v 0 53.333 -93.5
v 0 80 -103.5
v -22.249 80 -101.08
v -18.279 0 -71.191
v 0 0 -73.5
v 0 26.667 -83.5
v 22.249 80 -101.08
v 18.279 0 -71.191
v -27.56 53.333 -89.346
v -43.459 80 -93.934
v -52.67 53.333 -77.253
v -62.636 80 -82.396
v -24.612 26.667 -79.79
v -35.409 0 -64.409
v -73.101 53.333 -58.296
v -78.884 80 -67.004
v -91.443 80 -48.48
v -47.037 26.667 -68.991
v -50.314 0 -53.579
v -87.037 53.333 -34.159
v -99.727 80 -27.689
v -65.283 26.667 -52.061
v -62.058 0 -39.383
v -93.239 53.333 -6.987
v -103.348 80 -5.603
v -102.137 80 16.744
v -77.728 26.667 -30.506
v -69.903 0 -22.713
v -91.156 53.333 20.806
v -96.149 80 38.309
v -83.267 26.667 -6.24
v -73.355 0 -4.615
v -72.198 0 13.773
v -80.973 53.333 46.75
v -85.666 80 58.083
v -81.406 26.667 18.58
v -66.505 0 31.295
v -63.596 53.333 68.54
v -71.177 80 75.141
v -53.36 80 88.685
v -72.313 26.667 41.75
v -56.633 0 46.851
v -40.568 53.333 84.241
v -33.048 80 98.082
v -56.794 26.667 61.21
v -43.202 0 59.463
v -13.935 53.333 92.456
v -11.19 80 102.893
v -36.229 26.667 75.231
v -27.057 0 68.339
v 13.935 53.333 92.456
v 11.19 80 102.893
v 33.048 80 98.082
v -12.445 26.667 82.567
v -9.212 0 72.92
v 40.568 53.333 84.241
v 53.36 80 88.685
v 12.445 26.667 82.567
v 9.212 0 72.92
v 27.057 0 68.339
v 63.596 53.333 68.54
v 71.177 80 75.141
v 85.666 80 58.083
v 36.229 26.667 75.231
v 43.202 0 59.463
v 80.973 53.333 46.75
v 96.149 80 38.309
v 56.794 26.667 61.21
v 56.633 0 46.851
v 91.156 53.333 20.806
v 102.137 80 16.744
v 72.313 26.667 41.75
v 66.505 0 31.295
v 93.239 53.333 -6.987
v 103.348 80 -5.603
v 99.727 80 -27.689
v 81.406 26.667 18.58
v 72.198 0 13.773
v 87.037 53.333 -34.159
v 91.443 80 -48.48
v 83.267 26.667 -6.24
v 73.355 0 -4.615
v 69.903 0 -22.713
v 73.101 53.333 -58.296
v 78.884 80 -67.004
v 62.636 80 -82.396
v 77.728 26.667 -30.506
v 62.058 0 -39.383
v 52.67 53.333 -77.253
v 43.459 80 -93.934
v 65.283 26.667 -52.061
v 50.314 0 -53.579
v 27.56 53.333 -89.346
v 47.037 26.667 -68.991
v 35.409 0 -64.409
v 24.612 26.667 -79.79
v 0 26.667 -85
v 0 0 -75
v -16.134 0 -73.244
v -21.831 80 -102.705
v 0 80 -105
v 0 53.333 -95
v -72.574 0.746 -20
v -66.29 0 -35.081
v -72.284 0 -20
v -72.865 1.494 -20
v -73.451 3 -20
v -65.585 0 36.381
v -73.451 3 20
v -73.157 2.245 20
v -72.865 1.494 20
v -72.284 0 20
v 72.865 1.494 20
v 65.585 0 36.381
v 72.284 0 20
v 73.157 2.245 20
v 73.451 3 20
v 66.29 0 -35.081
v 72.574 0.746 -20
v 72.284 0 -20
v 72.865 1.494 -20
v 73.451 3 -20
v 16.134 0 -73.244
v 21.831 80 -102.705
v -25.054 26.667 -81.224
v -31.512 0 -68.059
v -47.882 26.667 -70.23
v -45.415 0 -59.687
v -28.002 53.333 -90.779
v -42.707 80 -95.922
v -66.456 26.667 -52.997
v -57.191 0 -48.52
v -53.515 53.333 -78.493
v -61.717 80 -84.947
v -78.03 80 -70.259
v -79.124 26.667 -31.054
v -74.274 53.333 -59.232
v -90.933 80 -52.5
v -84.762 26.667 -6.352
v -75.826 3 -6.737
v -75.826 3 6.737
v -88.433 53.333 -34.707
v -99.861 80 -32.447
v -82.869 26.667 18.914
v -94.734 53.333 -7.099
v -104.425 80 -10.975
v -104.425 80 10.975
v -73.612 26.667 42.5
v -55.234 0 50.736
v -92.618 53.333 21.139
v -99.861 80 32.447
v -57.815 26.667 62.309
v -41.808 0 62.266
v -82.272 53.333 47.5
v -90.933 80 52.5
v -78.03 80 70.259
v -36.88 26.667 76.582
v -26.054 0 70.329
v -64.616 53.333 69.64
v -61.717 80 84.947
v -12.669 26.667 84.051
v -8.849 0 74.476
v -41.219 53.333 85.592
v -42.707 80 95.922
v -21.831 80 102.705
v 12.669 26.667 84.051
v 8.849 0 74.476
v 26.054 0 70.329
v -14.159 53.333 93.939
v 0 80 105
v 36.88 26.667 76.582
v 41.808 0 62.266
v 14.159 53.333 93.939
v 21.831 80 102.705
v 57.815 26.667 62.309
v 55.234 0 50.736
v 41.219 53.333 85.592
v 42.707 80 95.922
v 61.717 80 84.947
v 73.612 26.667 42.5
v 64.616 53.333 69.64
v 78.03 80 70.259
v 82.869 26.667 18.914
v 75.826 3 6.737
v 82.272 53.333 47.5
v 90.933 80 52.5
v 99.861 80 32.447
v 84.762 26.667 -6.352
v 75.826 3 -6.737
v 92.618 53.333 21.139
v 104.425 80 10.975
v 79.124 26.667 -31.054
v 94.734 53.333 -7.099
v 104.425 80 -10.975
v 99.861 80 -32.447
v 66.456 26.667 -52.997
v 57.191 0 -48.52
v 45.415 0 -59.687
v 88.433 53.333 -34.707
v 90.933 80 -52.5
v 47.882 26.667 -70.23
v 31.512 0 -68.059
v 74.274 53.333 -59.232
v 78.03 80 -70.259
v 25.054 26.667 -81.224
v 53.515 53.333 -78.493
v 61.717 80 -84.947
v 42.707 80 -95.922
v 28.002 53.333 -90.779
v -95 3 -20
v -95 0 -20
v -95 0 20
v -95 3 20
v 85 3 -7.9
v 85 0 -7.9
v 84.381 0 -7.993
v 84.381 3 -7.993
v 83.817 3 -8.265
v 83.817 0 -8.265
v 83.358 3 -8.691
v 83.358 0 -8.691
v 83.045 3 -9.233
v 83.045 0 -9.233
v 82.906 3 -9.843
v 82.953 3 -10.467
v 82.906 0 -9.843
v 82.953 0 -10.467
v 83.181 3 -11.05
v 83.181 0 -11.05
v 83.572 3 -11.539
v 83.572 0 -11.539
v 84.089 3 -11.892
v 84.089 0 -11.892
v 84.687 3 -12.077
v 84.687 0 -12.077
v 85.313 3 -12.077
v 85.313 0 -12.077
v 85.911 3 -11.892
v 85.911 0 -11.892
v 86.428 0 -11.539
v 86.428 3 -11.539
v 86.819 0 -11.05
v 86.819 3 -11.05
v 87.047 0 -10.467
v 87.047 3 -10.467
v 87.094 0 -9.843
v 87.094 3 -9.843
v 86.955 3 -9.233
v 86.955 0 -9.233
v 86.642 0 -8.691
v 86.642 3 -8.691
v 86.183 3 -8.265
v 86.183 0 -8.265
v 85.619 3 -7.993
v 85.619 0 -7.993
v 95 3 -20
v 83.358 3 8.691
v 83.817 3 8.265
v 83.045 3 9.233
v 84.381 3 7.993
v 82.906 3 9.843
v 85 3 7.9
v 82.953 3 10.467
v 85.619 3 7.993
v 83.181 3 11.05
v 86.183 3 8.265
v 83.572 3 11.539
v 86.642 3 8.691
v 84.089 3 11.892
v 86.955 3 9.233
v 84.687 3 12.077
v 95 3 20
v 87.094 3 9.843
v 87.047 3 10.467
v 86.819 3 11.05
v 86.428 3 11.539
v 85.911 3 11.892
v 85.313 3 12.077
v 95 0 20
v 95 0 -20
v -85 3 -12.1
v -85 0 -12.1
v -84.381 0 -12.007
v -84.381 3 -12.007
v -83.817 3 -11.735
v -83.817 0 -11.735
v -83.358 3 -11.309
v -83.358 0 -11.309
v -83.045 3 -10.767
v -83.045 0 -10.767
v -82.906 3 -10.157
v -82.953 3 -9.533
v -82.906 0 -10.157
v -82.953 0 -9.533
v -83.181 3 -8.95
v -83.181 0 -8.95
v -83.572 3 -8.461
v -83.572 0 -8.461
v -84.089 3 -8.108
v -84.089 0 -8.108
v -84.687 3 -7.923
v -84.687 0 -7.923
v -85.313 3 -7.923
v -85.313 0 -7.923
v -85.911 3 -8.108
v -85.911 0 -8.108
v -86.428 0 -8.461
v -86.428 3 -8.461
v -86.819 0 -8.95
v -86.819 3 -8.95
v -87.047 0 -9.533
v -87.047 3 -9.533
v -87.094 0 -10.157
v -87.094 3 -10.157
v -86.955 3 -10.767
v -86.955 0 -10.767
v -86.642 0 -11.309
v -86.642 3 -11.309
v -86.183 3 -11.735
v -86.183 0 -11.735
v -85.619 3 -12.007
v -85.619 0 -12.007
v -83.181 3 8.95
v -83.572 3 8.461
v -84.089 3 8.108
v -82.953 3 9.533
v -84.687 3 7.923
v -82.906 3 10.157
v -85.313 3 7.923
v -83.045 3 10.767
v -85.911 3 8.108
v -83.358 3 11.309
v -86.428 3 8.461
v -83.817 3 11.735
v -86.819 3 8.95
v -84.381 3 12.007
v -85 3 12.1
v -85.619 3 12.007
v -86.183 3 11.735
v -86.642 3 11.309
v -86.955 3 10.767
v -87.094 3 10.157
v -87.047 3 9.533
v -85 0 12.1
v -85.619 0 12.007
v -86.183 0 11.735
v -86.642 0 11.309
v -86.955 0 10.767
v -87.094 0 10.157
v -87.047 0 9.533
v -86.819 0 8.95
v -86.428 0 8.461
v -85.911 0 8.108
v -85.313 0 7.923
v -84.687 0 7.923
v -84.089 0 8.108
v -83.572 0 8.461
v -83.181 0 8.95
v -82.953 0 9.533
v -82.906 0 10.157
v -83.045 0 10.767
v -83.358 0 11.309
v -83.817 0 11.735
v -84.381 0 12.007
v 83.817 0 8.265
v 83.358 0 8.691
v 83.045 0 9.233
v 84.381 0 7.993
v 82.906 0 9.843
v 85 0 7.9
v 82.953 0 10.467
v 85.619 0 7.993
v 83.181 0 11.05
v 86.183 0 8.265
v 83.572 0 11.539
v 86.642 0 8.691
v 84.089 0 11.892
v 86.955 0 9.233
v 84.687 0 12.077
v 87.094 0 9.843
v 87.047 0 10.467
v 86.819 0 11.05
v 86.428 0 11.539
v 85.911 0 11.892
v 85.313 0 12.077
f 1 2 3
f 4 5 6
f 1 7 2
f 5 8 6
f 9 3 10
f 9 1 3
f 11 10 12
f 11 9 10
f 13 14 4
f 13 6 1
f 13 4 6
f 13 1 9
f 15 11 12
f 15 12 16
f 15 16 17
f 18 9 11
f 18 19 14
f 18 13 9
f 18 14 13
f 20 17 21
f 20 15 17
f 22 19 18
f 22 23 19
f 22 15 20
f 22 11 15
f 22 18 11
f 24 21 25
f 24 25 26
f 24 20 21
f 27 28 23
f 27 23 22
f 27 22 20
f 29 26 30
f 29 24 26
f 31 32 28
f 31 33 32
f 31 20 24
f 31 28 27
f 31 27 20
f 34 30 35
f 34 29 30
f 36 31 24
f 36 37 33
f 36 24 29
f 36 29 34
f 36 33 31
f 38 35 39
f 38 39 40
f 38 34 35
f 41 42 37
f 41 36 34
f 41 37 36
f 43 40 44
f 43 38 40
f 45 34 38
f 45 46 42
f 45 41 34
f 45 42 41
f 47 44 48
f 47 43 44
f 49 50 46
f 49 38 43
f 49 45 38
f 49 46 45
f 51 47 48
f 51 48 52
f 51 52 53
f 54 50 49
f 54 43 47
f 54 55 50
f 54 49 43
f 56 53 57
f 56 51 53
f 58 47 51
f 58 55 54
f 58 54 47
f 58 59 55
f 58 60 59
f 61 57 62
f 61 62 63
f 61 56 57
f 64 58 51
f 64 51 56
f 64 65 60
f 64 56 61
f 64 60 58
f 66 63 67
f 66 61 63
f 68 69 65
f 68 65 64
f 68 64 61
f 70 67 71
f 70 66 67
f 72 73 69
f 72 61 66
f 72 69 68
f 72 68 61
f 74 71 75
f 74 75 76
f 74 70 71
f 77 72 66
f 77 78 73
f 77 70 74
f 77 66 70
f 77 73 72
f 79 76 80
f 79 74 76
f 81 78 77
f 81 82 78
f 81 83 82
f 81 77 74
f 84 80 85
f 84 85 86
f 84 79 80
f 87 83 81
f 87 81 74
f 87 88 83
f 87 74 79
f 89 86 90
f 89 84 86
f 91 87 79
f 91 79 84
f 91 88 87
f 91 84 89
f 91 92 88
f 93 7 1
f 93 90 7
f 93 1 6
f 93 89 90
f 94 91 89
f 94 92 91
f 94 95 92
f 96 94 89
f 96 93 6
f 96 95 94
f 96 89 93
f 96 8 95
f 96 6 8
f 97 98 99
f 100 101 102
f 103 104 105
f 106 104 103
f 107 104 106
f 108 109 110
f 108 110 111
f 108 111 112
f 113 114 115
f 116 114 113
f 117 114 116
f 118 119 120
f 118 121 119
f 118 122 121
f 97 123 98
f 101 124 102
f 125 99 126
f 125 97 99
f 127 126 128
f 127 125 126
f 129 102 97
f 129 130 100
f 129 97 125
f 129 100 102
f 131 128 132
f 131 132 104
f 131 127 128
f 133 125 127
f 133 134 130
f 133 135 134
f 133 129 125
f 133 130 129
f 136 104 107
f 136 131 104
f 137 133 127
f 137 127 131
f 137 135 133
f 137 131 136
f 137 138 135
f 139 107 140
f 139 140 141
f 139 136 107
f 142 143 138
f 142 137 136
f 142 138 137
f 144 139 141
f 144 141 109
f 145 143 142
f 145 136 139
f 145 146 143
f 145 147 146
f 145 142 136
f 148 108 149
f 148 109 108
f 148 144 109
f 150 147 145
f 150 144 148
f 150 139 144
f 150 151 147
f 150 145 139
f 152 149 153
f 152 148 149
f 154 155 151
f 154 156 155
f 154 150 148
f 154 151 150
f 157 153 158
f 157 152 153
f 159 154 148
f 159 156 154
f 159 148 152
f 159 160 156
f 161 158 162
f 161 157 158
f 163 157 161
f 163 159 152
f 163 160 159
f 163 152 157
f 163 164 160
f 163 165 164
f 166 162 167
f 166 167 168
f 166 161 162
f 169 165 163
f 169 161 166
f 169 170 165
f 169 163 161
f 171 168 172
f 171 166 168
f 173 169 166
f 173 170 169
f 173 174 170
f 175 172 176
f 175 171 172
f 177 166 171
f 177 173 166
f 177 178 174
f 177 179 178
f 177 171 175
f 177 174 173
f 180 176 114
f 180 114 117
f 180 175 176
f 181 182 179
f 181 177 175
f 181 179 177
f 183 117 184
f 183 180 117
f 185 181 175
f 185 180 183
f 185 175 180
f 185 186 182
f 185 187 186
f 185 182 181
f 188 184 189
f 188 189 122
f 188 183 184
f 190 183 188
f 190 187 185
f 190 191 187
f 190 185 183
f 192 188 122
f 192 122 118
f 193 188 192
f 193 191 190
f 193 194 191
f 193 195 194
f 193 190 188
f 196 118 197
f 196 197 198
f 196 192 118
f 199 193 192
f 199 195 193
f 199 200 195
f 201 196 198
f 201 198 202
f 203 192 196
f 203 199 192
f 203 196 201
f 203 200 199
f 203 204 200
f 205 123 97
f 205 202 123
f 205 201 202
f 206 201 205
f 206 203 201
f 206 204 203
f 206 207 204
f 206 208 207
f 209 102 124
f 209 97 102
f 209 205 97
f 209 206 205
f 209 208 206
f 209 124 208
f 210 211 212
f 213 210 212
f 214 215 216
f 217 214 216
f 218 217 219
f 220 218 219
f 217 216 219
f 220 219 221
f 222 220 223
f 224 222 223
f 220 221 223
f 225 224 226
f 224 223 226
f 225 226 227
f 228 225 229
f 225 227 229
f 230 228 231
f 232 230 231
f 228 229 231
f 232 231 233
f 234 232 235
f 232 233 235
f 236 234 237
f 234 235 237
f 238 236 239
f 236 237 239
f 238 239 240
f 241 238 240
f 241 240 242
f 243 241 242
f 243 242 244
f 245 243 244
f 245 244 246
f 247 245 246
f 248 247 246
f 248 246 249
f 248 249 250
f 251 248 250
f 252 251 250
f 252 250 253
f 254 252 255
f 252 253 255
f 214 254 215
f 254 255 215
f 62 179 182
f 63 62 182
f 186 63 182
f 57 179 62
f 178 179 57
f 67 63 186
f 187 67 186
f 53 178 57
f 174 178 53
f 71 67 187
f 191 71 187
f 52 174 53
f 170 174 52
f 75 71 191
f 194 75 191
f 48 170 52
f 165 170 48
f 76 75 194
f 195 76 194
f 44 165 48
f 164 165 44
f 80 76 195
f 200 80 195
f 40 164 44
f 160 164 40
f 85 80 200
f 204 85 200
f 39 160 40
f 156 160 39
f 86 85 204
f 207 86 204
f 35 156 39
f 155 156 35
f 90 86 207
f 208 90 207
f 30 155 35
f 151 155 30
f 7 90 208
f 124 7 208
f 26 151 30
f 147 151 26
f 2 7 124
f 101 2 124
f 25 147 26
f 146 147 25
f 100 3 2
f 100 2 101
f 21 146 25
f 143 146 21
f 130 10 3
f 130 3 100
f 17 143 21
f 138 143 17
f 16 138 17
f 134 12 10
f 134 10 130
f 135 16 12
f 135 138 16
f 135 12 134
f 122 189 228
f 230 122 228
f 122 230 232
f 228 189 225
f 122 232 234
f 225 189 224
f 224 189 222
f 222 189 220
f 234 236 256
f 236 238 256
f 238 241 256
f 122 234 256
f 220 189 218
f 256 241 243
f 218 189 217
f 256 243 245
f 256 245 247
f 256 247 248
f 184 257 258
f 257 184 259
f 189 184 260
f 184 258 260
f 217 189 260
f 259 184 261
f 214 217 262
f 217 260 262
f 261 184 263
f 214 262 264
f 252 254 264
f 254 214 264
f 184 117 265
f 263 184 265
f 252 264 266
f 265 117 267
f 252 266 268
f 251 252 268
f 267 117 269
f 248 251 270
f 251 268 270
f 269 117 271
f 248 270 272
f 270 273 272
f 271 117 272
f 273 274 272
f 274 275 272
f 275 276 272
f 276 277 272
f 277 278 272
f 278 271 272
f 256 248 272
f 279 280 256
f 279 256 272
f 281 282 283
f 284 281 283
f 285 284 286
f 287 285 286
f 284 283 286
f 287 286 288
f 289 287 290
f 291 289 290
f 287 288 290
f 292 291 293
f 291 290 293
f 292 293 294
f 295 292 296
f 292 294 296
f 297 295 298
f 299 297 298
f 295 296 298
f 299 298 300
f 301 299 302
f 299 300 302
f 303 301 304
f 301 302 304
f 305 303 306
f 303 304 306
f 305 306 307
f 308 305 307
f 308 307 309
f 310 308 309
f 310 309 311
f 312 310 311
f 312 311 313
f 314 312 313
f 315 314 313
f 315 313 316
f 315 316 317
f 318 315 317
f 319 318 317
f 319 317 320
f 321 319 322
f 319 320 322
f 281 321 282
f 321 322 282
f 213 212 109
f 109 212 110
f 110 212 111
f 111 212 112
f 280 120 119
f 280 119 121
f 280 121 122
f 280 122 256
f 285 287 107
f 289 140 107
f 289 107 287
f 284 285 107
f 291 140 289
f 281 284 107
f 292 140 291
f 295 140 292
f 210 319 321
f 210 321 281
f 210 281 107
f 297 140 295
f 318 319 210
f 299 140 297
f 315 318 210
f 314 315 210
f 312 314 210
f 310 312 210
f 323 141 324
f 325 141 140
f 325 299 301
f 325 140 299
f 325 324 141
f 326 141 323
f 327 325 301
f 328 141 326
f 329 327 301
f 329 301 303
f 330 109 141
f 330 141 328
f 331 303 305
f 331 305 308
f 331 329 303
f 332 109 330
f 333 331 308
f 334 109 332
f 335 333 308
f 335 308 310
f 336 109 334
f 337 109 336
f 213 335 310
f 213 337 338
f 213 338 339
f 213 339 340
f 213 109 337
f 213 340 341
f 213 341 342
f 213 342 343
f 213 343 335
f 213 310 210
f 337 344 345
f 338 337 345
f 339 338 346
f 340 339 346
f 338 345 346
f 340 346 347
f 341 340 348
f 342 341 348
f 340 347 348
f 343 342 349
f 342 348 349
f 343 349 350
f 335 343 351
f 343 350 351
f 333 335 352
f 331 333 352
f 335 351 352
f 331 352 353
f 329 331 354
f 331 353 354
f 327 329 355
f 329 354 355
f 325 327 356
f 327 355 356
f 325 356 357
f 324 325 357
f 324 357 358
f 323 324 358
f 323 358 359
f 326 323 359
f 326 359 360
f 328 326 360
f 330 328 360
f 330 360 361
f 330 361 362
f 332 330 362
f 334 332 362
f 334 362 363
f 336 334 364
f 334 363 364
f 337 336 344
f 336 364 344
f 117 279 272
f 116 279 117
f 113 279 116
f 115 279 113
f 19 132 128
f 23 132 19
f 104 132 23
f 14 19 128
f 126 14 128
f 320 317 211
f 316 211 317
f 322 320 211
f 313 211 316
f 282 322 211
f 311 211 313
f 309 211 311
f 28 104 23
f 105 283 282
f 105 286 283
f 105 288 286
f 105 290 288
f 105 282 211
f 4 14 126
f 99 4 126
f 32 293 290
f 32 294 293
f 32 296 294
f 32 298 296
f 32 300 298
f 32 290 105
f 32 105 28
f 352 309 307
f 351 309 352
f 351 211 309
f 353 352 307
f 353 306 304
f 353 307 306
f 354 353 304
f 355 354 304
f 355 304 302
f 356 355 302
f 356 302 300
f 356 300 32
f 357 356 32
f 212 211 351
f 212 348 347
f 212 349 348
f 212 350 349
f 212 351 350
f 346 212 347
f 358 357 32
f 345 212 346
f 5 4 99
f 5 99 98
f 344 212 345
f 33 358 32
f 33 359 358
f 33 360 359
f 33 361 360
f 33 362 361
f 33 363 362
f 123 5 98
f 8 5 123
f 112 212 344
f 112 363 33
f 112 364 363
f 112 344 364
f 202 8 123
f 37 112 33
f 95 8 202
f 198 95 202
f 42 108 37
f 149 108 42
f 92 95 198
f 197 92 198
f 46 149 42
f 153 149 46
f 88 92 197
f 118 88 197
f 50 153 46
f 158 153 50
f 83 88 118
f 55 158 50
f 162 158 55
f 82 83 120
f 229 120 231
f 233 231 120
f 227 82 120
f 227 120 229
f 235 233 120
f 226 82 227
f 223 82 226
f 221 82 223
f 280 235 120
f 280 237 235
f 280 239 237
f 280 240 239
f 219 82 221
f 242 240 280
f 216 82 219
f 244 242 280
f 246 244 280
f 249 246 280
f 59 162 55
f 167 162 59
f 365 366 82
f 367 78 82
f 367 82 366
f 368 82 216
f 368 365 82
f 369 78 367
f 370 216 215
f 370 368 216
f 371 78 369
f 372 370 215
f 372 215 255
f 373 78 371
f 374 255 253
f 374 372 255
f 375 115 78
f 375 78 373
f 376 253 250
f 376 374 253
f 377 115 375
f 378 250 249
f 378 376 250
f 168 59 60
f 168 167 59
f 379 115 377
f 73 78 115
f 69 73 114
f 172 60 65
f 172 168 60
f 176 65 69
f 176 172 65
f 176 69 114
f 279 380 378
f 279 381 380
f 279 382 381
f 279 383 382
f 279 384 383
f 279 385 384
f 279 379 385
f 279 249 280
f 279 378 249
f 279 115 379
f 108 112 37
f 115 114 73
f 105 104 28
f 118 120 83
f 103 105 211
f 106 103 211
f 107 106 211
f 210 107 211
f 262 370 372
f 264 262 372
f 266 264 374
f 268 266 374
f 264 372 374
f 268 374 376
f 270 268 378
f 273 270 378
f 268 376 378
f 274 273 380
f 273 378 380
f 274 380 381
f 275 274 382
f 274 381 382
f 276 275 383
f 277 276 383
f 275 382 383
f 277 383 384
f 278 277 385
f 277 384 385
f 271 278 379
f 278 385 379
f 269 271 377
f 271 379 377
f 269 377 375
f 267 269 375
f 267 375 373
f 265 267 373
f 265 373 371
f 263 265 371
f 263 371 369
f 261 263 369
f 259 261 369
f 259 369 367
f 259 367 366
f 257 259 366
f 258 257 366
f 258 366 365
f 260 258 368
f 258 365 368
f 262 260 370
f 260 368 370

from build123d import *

# Parameters (mm, degrees)
BOSS_EXTRUDE1_DEPTH = 3
SKETCH3_R           = 2.1
CUT_EXTRUDE1_DEPTH  = 3


with BuildPart() as part:
    # Sketch1 → Revolve1 (revolve)
    with BuildSketch(Plane.XY, mode=Mode.PRIVATE) as revolve1_sk:
        Polygon((73.5, 0), (75, 0), (105, 80), (103.5, 80), align=None)
    revolve(revolve1_sk.sketch.rotate(Axis((0, 0, 0), (0, 1, 0)), 90), axis=Axis((0, 0, 0), (0, 1, 0)))

    # Sketch2 → Boss-Extrude1 (add)
    with BuildSketch(Plane.XZ):
        with BuildLine():
            Line((72.284161474, -20), (95, -20))
            Line((95, -20), (95, 20))
            Line((95, 20), (72.284161474, 20))
            ThreePointArc((72.284161474, 20), (75, 0), (72.284161474, -20))
        make_face()
        with BuildLine():
            Line((-95, 20), (-72.284161474, 20))
            ThreePointArc((-72.284161474, 20), (-75, 0), (-72.284161474, -20))
            Line((-72.284161474, -20), (-95, -20))
            Line((-95, -20), (-95, 20))
        make_face()
    extrude(amount=-BOSS_EXTRUDE1_DEPTH)

    # Sketch3 → Cut-Extrude1 (cut)
    with BuildSketch(Plane.XZ):
        with Locations(Location((85, 10, 0), (0, 0, 270))):
            Circle(SKETCH3_R)
        with Locations(Location((85, -10, 0), (0, 0, 90))):
            Circle(SKETCH3_R)
        with Locations(Location((-85, -10, 0), (0, 0, 270))):
            Circle(SKETCH3_R)
        with Locations(Location((-85, 10, 0), (0, 0, 90))):
            Circle(SKETCH3_R)
    extrude(amount=-CUT_EXTRUDE1_DEPTH, mode=Mode.SUBTRACT)


solid = part.part
